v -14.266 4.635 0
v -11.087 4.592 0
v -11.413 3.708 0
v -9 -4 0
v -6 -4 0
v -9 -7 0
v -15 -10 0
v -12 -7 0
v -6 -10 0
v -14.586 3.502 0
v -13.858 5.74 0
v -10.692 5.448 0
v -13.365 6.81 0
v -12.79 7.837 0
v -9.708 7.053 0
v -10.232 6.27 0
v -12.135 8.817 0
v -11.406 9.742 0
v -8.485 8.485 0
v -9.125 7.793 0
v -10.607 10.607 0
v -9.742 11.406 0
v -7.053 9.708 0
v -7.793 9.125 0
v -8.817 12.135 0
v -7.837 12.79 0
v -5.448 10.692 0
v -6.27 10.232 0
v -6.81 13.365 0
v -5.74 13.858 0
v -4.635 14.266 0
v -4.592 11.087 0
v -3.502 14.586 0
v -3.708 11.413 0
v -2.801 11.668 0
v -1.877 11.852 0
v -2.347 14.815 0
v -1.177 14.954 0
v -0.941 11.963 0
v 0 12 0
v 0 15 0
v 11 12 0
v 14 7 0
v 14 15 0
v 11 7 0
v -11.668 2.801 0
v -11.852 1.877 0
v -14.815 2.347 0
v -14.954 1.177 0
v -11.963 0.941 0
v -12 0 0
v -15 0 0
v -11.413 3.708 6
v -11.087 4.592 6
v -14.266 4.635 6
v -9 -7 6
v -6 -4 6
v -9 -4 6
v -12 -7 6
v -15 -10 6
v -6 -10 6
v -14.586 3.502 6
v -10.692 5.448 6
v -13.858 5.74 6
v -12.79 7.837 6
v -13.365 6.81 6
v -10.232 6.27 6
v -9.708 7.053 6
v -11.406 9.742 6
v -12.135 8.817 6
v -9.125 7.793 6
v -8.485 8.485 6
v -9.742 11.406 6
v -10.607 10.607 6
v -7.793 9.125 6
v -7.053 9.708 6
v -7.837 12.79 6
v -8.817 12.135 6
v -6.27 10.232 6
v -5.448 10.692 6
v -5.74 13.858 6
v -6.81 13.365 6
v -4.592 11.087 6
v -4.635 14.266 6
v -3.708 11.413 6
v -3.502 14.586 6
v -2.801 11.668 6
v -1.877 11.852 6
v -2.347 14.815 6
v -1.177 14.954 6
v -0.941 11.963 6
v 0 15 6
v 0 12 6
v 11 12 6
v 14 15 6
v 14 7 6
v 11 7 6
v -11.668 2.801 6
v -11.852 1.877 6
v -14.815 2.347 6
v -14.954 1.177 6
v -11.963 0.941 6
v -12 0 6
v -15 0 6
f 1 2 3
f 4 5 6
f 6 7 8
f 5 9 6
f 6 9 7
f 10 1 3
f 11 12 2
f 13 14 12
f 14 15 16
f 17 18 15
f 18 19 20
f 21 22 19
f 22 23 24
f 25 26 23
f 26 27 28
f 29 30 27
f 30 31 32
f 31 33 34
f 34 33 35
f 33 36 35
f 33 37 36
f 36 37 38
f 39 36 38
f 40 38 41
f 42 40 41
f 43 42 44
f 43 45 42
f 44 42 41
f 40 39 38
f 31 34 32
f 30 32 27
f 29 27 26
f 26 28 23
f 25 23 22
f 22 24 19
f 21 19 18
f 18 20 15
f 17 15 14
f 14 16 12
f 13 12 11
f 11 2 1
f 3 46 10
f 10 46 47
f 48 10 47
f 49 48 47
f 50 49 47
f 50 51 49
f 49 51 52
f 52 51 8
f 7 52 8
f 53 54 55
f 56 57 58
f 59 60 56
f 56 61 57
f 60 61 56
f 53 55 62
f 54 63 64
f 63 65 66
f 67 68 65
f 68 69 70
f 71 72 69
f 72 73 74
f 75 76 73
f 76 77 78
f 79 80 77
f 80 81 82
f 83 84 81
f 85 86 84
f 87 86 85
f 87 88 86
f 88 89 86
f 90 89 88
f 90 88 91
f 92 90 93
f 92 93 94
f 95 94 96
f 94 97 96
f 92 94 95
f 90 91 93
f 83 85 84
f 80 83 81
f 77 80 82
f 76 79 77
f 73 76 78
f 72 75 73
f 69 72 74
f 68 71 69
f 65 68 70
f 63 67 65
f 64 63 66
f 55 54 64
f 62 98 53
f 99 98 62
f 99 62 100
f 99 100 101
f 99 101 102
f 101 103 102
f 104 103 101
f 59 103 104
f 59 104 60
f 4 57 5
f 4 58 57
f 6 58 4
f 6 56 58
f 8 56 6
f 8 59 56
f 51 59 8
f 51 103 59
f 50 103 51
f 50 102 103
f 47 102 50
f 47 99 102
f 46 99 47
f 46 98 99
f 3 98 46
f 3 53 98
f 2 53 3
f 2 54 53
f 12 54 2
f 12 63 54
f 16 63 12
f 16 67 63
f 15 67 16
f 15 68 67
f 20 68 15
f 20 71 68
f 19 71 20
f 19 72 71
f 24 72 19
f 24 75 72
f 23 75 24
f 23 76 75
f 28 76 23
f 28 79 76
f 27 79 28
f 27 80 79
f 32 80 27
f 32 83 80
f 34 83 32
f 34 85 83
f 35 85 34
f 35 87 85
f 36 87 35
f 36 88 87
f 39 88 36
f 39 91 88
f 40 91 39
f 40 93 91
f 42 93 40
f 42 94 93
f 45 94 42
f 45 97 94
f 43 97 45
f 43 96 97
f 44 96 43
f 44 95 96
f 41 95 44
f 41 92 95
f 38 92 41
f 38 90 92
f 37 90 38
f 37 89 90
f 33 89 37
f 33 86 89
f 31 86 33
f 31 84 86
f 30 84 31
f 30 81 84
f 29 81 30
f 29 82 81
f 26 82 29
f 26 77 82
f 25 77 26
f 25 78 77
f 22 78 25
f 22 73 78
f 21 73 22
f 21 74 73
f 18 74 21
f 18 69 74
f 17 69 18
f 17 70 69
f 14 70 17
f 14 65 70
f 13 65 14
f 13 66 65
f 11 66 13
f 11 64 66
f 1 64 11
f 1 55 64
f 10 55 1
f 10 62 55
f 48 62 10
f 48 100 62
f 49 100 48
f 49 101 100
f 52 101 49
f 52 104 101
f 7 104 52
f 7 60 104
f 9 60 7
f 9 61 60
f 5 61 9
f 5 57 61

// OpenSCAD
//square();
//polygon([[1,1],[2,2],[10,4]]);

W=3;

r=12;
R=r+W;
A=19-r; // side
B=23-r; // top
CT=5;  // hinge top
AT=3;
AK=3;

steps=20;
points = [

    [-r,-A],
    [-r,0],
	for (a = [0: 1 : steps]) r*[ -cos(a*90/steps),sin(a*90/steps) ],
    [B,r],
    
    [B,r-CT],
    [B+W,r-CT],
    
    [B+W,R],
	for (a = [steps: -1 : 0]) R*[ -cos(a*90/steps),sin(a*90/steps) ],
    [-R,0],
    [-R,-A],

    [-R,-A-W],
    [-r+AT+W,-A-W],
    [-r+AT+W,-A+AK],
    [-r+AT,-A+AK],
    [-r+AT,-A],

];


linear_extrude(6)
polygon(points);
